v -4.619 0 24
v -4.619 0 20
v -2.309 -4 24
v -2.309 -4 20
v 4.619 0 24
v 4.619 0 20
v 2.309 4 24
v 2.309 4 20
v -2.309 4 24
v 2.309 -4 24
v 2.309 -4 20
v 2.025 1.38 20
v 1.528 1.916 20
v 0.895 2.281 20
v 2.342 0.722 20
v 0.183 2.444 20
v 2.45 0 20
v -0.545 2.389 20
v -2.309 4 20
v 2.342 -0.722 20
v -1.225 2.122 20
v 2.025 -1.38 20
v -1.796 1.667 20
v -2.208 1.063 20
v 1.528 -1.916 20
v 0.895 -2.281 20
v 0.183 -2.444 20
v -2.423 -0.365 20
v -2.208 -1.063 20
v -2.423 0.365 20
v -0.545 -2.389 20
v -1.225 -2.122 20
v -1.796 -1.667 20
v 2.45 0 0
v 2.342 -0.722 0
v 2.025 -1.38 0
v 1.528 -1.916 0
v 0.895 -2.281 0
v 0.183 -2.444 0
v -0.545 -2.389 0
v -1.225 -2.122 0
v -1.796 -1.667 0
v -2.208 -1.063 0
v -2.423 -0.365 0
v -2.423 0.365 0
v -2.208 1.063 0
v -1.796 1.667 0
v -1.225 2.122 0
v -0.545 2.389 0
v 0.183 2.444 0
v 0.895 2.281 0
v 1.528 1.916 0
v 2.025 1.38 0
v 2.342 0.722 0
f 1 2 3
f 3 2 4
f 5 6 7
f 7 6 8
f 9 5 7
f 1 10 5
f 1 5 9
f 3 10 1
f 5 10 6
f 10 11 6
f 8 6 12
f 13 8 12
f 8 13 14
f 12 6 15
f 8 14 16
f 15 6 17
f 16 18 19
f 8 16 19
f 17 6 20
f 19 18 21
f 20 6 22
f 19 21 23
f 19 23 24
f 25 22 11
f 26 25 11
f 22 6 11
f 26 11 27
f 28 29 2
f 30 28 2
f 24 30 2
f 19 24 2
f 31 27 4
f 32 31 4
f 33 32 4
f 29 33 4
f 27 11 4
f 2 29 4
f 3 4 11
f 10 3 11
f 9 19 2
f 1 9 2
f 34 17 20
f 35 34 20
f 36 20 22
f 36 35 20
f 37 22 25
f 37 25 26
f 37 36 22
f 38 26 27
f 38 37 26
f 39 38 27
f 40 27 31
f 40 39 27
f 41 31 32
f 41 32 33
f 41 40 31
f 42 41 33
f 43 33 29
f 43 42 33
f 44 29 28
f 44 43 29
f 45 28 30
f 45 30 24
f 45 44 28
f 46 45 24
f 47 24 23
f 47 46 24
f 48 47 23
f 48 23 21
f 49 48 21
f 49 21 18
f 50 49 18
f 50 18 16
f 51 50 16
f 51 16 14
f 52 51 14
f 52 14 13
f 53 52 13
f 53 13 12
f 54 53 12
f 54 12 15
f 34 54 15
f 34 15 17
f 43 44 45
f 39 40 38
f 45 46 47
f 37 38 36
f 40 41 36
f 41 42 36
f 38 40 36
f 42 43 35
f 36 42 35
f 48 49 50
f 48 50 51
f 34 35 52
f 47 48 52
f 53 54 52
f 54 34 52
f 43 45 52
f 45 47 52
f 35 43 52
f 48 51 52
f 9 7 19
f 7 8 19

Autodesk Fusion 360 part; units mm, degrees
sketch "Sketch1" plane through (0, 0, 0) normal (0, 0, 1) x (1, 0, 0)
  circle A0 centre (0, 0) radius 2.5
  dimension "d1" = 5
extrude "Extrude1" add sketch "Sketch1" along normal blind 20
sketch "Sketch2" plane through (0, 0, 20) normal (0, 0, 1) x (-1, 0, 0)
  circle A0 centre (0, 0) radius 2.5
  line L0 (-2.3094, 4) -> (-4.6188, 0)
  line L1 (-4.6188, 0) -> (-2.3094, -4)
  line L2 (-2.3094, -4) -> (2.3094, -4)
  line L3 (2.3094, -4) -> (4.6188, 0)
  line L4 (4.6188, 0) -> (2.3094, 4)
  line L5 (2.3094, 4) -> (-2.3094, 4)
  dimension "d4" = 4
extrude "Extrude2" add sketch "Sketch2" along normal blind 4 contours A0 | L0 L1 L2 L3 L4 L5
thread "Thread1" "ISO Metric profile 5.0 M5x0.8 6g" major diameter 4.901 minor diameter 3.9895 pitch 0.8 angle 60 resizes the face on face at (2.4969, -0.1246, 13.3333)
